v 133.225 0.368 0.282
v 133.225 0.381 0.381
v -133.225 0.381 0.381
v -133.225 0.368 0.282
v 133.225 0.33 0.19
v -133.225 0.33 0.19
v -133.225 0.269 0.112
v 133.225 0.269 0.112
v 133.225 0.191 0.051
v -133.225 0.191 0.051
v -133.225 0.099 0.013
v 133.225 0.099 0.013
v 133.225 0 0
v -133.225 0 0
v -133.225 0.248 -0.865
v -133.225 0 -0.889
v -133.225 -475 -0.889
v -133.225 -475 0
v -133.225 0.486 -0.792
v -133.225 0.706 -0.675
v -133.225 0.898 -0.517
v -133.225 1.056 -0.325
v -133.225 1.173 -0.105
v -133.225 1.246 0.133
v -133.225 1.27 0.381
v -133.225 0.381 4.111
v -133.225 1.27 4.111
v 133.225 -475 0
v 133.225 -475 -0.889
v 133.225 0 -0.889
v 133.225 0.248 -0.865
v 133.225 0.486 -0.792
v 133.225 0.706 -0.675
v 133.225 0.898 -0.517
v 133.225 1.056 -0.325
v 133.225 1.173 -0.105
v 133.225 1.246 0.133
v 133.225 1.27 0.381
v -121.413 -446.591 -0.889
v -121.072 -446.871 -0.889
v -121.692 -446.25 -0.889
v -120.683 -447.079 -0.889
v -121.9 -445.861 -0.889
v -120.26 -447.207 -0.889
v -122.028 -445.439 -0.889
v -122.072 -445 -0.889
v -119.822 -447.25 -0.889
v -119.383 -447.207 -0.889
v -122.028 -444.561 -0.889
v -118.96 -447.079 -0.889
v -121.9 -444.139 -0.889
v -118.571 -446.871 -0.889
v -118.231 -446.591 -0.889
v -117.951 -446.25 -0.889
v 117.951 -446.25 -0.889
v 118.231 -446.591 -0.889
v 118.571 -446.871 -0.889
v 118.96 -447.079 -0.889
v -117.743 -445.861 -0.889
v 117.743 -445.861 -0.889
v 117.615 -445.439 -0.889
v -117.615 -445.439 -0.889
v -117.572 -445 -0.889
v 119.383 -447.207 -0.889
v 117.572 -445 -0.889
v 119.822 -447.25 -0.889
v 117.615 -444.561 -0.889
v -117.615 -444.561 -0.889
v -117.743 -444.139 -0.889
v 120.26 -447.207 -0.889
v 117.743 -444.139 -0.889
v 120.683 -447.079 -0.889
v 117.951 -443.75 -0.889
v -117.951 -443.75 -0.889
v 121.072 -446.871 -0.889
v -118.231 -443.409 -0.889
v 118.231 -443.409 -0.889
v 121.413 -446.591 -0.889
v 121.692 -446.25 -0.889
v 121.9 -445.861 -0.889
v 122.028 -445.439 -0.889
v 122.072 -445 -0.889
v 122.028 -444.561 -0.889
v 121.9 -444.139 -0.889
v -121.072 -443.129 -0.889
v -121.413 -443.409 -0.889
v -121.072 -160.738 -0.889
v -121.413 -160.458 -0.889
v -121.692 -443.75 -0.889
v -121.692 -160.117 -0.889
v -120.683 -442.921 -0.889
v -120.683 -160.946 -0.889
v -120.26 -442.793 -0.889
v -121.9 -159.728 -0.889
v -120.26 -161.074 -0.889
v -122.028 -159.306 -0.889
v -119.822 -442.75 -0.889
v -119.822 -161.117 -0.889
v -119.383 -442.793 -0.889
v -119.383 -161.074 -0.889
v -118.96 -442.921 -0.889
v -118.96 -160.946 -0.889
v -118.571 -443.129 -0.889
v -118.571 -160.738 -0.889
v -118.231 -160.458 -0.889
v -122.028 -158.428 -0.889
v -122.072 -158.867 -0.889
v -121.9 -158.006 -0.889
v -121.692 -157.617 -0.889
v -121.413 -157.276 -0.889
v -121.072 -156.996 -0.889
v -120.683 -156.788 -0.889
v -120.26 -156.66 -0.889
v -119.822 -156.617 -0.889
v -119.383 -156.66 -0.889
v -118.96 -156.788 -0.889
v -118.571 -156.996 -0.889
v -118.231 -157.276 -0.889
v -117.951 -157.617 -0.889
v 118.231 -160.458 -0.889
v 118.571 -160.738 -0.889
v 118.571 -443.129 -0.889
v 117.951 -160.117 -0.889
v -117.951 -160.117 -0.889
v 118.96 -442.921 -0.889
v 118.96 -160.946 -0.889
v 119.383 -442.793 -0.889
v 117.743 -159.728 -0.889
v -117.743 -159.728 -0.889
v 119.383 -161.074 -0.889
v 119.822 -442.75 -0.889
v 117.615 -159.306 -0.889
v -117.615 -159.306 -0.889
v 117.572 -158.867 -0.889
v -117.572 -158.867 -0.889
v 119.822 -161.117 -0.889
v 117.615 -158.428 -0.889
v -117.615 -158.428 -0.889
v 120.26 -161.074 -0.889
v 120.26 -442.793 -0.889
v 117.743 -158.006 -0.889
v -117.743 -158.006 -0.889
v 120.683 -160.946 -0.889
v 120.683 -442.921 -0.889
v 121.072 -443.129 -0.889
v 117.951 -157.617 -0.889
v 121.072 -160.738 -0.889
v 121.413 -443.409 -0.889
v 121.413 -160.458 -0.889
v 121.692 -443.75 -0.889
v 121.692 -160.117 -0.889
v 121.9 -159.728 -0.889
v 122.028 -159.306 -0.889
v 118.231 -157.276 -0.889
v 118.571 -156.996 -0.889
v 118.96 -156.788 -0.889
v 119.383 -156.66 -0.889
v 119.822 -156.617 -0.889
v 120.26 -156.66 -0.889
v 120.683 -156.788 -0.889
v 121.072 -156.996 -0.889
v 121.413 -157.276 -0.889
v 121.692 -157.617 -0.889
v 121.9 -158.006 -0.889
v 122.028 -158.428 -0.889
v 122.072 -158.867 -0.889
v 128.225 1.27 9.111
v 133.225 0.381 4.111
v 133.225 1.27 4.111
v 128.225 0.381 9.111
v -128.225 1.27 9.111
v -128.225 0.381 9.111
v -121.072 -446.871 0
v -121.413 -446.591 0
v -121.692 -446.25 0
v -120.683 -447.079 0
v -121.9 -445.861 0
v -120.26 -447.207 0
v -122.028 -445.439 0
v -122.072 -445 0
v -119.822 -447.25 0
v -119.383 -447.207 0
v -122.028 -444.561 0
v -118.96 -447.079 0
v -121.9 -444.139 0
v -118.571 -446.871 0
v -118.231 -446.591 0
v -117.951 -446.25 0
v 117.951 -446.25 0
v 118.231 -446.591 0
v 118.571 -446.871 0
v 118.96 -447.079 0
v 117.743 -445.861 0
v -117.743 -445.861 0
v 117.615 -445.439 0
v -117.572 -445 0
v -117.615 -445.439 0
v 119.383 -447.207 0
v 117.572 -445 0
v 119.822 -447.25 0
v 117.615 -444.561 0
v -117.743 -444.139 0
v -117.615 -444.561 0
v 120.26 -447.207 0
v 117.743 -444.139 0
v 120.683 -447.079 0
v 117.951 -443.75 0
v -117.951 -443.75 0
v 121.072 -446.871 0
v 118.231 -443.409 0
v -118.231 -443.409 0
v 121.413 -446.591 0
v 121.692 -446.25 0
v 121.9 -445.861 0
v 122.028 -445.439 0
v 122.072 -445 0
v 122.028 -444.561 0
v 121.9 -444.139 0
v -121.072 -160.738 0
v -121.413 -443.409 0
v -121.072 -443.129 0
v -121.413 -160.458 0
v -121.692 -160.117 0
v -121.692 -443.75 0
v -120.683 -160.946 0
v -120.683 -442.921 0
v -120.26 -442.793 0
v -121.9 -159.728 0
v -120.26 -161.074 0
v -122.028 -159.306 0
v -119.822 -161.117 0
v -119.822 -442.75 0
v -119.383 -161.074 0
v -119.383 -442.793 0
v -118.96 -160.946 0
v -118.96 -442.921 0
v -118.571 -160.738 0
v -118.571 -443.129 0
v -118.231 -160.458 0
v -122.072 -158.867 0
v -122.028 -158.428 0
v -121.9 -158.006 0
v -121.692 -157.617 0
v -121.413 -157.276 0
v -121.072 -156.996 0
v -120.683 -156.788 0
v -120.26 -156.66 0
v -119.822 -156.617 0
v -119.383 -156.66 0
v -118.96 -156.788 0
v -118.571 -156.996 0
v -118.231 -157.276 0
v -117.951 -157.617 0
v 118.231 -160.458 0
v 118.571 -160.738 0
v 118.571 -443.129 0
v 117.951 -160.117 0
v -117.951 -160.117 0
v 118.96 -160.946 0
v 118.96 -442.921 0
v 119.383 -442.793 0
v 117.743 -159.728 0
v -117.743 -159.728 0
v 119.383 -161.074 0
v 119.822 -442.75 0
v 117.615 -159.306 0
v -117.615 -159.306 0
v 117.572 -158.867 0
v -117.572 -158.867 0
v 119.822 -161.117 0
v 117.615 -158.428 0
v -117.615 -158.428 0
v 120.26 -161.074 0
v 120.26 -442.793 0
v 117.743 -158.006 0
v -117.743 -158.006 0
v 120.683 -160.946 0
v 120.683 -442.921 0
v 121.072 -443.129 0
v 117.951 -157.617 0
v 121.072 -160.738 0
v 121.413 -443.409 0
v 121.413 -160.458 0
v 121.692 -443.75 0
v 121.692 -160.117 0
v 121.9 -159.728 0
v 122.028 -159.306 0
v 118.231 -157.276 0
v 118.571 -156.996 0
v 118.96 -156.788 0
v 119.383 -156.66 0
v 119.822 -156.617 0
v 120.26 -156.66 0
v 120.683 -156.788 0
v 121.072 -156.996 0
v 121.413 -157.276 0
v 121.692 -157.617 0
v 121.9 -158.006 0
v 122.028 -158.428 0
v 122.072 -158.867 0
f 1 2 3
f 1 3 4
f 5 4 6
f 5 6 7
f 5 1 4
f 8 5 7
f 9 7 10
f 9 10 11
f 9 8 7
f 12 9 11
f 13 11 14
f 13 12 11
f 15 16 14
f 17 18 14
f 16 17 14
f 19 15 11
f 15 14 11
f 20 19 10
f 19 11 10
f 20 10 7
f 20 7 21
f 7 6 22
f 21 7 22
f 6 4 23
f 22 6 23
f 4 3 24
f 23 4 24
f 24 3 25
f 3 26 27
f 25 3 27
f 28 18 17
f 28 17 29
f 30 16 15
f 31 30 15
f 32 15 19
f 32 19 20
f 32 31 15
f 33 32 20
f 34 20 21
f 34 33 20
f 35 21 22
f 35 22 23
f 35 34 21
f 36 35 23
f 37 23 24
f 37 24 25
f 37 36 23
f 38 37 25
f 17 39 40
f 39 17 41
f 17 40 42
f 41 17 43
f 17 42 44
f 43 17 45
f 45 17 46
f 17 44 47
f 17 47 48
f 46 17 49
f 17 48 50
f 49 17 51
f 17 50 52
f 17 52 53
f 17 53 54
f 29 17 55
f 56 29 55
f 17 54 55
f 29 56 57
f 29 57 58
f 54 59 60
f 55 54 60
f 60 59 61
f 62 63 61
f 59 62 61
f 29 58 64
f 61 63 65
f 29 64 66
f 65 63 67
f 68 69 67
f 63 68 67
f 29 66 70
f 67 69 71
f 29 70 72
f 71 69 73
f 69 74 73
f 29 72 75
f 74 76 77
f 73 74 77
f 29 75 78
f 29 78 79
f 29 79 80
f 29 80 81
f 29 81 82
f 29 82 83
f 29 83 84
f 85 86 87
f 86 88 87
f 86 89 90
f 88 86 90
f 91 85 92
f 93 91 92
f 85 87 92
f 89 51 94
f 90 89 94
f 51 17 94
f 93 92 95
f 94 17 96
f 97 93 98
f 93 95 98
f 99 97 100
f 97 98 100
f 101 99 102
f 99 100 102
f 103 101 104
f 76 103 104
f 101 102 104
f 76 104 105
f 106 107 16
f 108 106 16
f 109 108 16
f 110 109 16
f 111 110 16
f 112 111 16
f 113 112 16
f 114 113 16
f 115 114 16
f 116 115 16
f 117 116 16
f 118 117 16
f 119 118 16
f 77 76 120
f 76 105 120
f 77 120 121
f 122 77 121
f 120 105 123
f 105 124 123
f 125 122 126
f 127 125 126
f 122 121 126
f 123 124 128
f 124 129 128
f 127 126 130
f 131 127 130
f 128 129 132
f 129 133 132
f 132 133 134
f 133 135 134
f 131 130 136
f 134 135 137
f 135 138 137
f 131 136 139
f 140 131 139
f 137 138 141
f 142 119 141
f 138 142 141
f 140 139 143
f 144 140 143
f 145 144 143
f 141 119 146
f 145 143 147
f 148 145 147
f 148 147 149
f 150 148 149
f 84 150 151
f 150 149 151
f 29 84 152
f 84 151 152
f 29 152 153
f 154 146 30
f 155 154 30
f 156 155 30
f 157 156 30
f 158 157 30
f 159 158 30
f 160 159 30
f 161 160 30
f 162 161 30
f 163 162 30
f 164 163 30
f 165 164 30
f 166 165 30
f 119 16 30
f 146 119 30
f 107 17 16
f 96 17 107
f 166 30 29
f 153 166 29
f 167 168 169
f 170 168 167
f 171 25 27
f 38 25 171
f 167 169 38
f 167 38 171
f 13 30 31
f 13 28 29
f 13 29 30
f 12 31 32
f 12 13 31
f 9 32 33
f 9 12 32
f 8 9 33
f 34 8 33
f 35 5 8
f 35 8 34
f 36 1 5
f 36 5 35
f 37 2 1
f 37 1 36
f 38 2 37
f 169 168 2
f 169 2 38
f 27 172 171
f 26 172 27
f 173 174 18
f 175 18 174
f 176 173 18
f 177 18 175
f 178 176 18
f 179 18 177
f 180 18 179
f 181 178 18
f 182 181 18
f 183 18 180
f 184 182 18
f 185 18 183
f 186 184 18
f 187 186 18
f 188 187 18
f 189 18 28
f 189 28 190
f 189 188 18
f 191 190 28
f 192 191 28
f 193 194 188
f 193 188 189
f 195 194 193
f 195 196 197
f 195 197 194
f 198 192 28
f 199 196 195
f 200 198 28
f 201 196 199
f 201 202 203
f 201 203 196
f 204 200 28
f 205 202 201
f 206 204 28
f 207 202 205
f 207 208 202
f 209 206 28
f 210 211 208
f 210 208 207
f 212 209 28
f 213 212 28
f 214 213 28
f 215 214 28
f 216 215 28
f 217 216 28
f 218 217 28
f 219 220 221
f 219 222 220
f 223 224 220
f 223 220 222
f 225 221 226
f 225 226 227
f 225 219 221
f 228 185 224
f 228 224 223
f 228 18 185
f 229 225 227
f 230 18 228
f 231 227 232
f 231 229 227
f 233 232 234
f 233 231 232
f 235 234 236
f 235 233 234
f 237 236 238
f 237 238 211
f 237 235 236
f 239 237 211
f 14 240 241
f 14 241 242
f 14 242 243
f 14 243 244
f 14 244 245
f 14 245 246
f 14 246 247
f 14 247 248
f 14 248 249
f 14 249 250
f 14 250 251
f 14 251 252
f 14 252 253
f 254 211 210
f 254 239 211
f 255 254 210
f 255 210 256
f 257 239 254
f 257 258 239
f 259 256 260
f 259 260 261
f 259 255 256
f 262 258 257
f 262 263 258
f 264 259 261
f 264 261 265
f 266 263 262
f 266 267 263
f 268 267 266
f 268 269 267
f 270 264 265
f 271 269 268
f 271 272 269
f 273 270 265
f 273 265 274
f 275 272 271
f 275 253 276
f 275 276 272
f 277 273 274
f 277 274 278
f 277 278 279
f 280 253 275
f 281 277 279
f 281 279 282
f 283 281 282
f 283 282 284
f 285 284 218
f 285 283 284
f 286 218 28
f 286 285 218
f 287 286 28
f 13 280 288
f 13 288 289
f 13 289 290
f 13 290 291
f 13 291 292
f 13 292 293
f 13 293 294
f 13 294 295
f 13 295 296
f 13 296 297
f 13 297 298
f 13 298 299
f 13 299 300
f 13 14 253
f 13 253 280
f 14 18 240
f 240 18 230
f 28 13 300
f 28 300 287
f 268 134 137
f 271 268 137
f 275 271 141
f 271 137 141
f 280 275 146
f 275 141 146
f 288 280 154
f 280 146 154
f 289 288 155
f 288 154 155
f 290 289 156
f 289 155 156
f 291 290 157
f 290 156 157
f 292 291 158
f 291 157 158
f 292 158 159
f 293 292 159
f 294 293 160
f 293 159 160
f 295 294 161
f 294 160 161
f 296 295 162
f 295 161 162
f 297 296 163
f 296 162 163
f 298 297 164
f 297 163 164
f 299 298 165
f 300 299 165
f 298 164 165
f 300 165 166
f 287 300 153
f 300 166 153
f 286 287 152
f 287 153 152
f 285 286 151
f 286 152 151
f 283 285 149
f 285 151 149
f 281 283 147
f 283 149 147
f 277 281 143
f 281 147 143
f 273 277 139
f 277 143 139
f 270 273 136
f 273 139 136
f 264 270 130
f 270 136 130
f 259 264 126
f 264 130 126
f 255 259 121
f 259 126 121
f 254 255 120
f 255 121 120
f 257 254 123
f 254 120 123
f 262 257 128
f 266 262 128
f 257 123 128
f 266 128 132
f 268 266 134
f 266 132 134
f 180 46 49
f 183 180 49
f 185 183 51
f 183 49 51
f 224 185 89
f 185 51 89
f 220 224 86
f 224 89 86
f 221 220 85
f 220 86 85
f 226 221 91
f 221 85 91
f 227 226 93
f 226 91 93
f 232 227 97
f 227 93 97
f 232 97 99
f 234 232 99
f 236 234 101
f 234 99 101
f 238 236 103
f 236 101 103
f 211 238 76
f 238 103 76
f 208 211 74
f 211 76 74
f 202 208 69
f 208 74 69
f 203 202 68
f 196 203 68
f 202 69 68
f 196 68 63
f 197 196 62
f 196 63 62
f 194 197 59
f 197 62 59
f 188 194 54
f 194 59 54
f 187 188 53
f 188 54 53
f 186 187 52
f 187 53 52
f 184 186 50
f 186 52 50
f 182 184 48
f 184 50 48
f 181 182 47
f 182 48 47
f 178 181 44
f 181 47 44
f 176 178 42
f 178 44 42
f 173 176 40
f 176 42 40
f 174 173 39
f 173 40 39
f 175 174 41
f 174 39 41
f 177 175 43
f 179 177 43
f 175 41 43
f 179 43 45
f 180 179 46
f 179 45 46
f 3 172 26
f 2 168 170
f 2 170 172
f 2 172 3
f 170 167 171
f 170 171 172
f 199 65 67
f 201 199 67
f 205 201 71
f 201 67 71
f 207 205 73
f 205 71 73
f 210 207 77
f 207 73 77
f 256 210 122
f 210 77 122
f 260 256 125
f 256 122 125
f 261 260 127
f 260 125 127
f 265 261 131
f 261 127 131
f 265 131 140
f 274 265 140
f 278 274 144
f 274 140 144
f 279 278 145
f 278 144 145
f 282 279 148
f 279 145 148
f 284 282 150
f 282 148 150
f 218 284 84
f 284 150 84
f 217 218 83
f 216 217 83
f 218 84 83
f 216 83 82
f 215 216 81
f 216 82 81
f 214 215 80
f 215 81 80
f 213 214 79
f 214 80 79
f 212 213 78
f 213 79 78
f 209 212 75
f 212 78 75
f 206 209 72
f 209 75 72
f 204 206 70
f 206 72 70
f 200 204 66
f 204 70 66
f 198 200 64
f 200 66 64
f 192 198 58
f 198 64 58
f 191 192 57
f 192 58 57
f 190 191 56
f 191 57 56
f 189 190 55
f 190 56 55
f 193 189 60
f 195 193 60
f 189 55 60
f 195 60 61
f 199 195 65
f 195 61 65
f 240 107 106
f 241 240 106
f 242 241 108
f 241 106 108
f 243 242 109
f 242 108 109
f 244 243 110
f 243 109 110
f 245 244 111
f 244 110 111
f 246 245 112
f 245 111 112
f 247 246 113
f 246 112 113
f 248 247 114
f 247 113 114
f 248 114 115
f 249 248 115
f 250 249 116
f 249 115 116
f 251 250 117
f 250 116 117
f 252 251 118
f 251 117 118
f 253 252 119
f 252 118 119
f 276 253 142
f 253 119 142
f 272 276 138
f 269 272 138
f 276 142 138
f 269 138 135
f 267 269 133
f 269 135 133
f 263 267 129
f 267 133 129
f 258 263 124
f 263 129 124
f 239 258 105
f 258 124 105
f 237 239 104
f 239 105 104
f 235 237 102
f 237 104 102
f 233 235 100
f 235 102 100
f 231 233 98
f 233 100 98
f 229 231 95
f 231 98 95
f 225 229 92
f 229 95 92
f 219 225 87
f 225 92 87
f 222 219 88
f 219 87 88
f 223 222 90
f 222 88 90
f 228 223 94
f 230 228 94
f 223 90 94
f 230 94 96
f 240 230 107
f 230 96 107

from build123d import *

# Parameters (mm, degrees)
SKETCH1_W           = 266.4508474
SKETCH1_H           = 475
BASE_FLANGE1_DEPTH  = 0.889
SKETCH6_R           = 2.25
CUT_EXTRUDE1_DEPTH  = 0.889
EDGE_FLANGE3_DEPTH  = 266.4508474
BREAK_CORNER1_START = 0.381
BREAK_CORNER1_DEPTH = 0.889


# Read off the part's stored shape, not the designer's step: Break-Corner1
# Sheet-metal steps are written as plain solids
with BuildPart() as part:
    # Sketch1 → Base-Flange1 (new body)
    with BuildSketch(Plane.XY):
        with Locations((0, -237.5)):
            Rectangle(SKETCH1_W, SKETCH1_H)
    extrude(amount=-BASE_FLANGE1_DEPTH)

    # Sketch6 → Cut-Extrude1 (cut)
    with BuildSketch(Plane(origin=(0, 0, -0.889), x_dir=(-1, 0, 0), z_dir=(0, 0, -1))):
        with Locations((-119.8215307, -158.867160024)):
            Circle(SKETCH6_R)
        with Locations((119.8215307, -158.867160024)):
            Circle(SKETCH6_R)
        with Locations((-119.8215307, -445)):
            Circle(SKETCH6_R)
        with Locations((119.8215307, -445)):
            Circle(SKETCH6_R)
    extrude(amount=-CUT_EXTRUDE1_DEPTH, mode=Mode.SUBTRACT)

    # Edge-Flange3 section (across the edge) → Edge-Flange3 (add)
    with BuildSketch(Plane(origin=(133.2254237, 0.381, 0), x_dir=(0, -1, 0), z_dir=(-1, 0, 0))):
        with BuildLine():
            Line((-0.889, 0.381), (-0.889, 9.111))
            Line((-0.889, 9.111), (0, 9.111))
            Line((0, 9.111), (0, 0.381))
            ThreePointArc((0, 0.381), (0.111592316, 0.111592316), (0.381, 0))
            Line((0.381, 0), (0.381, -0.889))
            ThreePointArc((0.381, -0.889), (-0.517025612, -0.517025612), (-0.889, 0.381))
        make_face()
    extrude(amount=EDGE_FLANGE3_DEPTH)

    # Break-Corner1 outline → Break-Corner1 (cut)
    with BuildSketch(Plane(origin=(0, 0, 0), x_dir=(1, 0, 0), z_dir=(0, 1, 0)).offset(BREAK_CORNER1_START)):
        Polygon((-133.2254237, -9.111), (-128.2254237, -9.111), (-133.2254237, -4.111), align=None)
        Polygon((133.2254237, -4.111), (128.2254237, -9.111), (133.2254237, -9.111), align=None)
    extrude(amount=BREAK_CORNER1_DEPTH, mode=Mode.SUBTRACT)


solid = part.part
